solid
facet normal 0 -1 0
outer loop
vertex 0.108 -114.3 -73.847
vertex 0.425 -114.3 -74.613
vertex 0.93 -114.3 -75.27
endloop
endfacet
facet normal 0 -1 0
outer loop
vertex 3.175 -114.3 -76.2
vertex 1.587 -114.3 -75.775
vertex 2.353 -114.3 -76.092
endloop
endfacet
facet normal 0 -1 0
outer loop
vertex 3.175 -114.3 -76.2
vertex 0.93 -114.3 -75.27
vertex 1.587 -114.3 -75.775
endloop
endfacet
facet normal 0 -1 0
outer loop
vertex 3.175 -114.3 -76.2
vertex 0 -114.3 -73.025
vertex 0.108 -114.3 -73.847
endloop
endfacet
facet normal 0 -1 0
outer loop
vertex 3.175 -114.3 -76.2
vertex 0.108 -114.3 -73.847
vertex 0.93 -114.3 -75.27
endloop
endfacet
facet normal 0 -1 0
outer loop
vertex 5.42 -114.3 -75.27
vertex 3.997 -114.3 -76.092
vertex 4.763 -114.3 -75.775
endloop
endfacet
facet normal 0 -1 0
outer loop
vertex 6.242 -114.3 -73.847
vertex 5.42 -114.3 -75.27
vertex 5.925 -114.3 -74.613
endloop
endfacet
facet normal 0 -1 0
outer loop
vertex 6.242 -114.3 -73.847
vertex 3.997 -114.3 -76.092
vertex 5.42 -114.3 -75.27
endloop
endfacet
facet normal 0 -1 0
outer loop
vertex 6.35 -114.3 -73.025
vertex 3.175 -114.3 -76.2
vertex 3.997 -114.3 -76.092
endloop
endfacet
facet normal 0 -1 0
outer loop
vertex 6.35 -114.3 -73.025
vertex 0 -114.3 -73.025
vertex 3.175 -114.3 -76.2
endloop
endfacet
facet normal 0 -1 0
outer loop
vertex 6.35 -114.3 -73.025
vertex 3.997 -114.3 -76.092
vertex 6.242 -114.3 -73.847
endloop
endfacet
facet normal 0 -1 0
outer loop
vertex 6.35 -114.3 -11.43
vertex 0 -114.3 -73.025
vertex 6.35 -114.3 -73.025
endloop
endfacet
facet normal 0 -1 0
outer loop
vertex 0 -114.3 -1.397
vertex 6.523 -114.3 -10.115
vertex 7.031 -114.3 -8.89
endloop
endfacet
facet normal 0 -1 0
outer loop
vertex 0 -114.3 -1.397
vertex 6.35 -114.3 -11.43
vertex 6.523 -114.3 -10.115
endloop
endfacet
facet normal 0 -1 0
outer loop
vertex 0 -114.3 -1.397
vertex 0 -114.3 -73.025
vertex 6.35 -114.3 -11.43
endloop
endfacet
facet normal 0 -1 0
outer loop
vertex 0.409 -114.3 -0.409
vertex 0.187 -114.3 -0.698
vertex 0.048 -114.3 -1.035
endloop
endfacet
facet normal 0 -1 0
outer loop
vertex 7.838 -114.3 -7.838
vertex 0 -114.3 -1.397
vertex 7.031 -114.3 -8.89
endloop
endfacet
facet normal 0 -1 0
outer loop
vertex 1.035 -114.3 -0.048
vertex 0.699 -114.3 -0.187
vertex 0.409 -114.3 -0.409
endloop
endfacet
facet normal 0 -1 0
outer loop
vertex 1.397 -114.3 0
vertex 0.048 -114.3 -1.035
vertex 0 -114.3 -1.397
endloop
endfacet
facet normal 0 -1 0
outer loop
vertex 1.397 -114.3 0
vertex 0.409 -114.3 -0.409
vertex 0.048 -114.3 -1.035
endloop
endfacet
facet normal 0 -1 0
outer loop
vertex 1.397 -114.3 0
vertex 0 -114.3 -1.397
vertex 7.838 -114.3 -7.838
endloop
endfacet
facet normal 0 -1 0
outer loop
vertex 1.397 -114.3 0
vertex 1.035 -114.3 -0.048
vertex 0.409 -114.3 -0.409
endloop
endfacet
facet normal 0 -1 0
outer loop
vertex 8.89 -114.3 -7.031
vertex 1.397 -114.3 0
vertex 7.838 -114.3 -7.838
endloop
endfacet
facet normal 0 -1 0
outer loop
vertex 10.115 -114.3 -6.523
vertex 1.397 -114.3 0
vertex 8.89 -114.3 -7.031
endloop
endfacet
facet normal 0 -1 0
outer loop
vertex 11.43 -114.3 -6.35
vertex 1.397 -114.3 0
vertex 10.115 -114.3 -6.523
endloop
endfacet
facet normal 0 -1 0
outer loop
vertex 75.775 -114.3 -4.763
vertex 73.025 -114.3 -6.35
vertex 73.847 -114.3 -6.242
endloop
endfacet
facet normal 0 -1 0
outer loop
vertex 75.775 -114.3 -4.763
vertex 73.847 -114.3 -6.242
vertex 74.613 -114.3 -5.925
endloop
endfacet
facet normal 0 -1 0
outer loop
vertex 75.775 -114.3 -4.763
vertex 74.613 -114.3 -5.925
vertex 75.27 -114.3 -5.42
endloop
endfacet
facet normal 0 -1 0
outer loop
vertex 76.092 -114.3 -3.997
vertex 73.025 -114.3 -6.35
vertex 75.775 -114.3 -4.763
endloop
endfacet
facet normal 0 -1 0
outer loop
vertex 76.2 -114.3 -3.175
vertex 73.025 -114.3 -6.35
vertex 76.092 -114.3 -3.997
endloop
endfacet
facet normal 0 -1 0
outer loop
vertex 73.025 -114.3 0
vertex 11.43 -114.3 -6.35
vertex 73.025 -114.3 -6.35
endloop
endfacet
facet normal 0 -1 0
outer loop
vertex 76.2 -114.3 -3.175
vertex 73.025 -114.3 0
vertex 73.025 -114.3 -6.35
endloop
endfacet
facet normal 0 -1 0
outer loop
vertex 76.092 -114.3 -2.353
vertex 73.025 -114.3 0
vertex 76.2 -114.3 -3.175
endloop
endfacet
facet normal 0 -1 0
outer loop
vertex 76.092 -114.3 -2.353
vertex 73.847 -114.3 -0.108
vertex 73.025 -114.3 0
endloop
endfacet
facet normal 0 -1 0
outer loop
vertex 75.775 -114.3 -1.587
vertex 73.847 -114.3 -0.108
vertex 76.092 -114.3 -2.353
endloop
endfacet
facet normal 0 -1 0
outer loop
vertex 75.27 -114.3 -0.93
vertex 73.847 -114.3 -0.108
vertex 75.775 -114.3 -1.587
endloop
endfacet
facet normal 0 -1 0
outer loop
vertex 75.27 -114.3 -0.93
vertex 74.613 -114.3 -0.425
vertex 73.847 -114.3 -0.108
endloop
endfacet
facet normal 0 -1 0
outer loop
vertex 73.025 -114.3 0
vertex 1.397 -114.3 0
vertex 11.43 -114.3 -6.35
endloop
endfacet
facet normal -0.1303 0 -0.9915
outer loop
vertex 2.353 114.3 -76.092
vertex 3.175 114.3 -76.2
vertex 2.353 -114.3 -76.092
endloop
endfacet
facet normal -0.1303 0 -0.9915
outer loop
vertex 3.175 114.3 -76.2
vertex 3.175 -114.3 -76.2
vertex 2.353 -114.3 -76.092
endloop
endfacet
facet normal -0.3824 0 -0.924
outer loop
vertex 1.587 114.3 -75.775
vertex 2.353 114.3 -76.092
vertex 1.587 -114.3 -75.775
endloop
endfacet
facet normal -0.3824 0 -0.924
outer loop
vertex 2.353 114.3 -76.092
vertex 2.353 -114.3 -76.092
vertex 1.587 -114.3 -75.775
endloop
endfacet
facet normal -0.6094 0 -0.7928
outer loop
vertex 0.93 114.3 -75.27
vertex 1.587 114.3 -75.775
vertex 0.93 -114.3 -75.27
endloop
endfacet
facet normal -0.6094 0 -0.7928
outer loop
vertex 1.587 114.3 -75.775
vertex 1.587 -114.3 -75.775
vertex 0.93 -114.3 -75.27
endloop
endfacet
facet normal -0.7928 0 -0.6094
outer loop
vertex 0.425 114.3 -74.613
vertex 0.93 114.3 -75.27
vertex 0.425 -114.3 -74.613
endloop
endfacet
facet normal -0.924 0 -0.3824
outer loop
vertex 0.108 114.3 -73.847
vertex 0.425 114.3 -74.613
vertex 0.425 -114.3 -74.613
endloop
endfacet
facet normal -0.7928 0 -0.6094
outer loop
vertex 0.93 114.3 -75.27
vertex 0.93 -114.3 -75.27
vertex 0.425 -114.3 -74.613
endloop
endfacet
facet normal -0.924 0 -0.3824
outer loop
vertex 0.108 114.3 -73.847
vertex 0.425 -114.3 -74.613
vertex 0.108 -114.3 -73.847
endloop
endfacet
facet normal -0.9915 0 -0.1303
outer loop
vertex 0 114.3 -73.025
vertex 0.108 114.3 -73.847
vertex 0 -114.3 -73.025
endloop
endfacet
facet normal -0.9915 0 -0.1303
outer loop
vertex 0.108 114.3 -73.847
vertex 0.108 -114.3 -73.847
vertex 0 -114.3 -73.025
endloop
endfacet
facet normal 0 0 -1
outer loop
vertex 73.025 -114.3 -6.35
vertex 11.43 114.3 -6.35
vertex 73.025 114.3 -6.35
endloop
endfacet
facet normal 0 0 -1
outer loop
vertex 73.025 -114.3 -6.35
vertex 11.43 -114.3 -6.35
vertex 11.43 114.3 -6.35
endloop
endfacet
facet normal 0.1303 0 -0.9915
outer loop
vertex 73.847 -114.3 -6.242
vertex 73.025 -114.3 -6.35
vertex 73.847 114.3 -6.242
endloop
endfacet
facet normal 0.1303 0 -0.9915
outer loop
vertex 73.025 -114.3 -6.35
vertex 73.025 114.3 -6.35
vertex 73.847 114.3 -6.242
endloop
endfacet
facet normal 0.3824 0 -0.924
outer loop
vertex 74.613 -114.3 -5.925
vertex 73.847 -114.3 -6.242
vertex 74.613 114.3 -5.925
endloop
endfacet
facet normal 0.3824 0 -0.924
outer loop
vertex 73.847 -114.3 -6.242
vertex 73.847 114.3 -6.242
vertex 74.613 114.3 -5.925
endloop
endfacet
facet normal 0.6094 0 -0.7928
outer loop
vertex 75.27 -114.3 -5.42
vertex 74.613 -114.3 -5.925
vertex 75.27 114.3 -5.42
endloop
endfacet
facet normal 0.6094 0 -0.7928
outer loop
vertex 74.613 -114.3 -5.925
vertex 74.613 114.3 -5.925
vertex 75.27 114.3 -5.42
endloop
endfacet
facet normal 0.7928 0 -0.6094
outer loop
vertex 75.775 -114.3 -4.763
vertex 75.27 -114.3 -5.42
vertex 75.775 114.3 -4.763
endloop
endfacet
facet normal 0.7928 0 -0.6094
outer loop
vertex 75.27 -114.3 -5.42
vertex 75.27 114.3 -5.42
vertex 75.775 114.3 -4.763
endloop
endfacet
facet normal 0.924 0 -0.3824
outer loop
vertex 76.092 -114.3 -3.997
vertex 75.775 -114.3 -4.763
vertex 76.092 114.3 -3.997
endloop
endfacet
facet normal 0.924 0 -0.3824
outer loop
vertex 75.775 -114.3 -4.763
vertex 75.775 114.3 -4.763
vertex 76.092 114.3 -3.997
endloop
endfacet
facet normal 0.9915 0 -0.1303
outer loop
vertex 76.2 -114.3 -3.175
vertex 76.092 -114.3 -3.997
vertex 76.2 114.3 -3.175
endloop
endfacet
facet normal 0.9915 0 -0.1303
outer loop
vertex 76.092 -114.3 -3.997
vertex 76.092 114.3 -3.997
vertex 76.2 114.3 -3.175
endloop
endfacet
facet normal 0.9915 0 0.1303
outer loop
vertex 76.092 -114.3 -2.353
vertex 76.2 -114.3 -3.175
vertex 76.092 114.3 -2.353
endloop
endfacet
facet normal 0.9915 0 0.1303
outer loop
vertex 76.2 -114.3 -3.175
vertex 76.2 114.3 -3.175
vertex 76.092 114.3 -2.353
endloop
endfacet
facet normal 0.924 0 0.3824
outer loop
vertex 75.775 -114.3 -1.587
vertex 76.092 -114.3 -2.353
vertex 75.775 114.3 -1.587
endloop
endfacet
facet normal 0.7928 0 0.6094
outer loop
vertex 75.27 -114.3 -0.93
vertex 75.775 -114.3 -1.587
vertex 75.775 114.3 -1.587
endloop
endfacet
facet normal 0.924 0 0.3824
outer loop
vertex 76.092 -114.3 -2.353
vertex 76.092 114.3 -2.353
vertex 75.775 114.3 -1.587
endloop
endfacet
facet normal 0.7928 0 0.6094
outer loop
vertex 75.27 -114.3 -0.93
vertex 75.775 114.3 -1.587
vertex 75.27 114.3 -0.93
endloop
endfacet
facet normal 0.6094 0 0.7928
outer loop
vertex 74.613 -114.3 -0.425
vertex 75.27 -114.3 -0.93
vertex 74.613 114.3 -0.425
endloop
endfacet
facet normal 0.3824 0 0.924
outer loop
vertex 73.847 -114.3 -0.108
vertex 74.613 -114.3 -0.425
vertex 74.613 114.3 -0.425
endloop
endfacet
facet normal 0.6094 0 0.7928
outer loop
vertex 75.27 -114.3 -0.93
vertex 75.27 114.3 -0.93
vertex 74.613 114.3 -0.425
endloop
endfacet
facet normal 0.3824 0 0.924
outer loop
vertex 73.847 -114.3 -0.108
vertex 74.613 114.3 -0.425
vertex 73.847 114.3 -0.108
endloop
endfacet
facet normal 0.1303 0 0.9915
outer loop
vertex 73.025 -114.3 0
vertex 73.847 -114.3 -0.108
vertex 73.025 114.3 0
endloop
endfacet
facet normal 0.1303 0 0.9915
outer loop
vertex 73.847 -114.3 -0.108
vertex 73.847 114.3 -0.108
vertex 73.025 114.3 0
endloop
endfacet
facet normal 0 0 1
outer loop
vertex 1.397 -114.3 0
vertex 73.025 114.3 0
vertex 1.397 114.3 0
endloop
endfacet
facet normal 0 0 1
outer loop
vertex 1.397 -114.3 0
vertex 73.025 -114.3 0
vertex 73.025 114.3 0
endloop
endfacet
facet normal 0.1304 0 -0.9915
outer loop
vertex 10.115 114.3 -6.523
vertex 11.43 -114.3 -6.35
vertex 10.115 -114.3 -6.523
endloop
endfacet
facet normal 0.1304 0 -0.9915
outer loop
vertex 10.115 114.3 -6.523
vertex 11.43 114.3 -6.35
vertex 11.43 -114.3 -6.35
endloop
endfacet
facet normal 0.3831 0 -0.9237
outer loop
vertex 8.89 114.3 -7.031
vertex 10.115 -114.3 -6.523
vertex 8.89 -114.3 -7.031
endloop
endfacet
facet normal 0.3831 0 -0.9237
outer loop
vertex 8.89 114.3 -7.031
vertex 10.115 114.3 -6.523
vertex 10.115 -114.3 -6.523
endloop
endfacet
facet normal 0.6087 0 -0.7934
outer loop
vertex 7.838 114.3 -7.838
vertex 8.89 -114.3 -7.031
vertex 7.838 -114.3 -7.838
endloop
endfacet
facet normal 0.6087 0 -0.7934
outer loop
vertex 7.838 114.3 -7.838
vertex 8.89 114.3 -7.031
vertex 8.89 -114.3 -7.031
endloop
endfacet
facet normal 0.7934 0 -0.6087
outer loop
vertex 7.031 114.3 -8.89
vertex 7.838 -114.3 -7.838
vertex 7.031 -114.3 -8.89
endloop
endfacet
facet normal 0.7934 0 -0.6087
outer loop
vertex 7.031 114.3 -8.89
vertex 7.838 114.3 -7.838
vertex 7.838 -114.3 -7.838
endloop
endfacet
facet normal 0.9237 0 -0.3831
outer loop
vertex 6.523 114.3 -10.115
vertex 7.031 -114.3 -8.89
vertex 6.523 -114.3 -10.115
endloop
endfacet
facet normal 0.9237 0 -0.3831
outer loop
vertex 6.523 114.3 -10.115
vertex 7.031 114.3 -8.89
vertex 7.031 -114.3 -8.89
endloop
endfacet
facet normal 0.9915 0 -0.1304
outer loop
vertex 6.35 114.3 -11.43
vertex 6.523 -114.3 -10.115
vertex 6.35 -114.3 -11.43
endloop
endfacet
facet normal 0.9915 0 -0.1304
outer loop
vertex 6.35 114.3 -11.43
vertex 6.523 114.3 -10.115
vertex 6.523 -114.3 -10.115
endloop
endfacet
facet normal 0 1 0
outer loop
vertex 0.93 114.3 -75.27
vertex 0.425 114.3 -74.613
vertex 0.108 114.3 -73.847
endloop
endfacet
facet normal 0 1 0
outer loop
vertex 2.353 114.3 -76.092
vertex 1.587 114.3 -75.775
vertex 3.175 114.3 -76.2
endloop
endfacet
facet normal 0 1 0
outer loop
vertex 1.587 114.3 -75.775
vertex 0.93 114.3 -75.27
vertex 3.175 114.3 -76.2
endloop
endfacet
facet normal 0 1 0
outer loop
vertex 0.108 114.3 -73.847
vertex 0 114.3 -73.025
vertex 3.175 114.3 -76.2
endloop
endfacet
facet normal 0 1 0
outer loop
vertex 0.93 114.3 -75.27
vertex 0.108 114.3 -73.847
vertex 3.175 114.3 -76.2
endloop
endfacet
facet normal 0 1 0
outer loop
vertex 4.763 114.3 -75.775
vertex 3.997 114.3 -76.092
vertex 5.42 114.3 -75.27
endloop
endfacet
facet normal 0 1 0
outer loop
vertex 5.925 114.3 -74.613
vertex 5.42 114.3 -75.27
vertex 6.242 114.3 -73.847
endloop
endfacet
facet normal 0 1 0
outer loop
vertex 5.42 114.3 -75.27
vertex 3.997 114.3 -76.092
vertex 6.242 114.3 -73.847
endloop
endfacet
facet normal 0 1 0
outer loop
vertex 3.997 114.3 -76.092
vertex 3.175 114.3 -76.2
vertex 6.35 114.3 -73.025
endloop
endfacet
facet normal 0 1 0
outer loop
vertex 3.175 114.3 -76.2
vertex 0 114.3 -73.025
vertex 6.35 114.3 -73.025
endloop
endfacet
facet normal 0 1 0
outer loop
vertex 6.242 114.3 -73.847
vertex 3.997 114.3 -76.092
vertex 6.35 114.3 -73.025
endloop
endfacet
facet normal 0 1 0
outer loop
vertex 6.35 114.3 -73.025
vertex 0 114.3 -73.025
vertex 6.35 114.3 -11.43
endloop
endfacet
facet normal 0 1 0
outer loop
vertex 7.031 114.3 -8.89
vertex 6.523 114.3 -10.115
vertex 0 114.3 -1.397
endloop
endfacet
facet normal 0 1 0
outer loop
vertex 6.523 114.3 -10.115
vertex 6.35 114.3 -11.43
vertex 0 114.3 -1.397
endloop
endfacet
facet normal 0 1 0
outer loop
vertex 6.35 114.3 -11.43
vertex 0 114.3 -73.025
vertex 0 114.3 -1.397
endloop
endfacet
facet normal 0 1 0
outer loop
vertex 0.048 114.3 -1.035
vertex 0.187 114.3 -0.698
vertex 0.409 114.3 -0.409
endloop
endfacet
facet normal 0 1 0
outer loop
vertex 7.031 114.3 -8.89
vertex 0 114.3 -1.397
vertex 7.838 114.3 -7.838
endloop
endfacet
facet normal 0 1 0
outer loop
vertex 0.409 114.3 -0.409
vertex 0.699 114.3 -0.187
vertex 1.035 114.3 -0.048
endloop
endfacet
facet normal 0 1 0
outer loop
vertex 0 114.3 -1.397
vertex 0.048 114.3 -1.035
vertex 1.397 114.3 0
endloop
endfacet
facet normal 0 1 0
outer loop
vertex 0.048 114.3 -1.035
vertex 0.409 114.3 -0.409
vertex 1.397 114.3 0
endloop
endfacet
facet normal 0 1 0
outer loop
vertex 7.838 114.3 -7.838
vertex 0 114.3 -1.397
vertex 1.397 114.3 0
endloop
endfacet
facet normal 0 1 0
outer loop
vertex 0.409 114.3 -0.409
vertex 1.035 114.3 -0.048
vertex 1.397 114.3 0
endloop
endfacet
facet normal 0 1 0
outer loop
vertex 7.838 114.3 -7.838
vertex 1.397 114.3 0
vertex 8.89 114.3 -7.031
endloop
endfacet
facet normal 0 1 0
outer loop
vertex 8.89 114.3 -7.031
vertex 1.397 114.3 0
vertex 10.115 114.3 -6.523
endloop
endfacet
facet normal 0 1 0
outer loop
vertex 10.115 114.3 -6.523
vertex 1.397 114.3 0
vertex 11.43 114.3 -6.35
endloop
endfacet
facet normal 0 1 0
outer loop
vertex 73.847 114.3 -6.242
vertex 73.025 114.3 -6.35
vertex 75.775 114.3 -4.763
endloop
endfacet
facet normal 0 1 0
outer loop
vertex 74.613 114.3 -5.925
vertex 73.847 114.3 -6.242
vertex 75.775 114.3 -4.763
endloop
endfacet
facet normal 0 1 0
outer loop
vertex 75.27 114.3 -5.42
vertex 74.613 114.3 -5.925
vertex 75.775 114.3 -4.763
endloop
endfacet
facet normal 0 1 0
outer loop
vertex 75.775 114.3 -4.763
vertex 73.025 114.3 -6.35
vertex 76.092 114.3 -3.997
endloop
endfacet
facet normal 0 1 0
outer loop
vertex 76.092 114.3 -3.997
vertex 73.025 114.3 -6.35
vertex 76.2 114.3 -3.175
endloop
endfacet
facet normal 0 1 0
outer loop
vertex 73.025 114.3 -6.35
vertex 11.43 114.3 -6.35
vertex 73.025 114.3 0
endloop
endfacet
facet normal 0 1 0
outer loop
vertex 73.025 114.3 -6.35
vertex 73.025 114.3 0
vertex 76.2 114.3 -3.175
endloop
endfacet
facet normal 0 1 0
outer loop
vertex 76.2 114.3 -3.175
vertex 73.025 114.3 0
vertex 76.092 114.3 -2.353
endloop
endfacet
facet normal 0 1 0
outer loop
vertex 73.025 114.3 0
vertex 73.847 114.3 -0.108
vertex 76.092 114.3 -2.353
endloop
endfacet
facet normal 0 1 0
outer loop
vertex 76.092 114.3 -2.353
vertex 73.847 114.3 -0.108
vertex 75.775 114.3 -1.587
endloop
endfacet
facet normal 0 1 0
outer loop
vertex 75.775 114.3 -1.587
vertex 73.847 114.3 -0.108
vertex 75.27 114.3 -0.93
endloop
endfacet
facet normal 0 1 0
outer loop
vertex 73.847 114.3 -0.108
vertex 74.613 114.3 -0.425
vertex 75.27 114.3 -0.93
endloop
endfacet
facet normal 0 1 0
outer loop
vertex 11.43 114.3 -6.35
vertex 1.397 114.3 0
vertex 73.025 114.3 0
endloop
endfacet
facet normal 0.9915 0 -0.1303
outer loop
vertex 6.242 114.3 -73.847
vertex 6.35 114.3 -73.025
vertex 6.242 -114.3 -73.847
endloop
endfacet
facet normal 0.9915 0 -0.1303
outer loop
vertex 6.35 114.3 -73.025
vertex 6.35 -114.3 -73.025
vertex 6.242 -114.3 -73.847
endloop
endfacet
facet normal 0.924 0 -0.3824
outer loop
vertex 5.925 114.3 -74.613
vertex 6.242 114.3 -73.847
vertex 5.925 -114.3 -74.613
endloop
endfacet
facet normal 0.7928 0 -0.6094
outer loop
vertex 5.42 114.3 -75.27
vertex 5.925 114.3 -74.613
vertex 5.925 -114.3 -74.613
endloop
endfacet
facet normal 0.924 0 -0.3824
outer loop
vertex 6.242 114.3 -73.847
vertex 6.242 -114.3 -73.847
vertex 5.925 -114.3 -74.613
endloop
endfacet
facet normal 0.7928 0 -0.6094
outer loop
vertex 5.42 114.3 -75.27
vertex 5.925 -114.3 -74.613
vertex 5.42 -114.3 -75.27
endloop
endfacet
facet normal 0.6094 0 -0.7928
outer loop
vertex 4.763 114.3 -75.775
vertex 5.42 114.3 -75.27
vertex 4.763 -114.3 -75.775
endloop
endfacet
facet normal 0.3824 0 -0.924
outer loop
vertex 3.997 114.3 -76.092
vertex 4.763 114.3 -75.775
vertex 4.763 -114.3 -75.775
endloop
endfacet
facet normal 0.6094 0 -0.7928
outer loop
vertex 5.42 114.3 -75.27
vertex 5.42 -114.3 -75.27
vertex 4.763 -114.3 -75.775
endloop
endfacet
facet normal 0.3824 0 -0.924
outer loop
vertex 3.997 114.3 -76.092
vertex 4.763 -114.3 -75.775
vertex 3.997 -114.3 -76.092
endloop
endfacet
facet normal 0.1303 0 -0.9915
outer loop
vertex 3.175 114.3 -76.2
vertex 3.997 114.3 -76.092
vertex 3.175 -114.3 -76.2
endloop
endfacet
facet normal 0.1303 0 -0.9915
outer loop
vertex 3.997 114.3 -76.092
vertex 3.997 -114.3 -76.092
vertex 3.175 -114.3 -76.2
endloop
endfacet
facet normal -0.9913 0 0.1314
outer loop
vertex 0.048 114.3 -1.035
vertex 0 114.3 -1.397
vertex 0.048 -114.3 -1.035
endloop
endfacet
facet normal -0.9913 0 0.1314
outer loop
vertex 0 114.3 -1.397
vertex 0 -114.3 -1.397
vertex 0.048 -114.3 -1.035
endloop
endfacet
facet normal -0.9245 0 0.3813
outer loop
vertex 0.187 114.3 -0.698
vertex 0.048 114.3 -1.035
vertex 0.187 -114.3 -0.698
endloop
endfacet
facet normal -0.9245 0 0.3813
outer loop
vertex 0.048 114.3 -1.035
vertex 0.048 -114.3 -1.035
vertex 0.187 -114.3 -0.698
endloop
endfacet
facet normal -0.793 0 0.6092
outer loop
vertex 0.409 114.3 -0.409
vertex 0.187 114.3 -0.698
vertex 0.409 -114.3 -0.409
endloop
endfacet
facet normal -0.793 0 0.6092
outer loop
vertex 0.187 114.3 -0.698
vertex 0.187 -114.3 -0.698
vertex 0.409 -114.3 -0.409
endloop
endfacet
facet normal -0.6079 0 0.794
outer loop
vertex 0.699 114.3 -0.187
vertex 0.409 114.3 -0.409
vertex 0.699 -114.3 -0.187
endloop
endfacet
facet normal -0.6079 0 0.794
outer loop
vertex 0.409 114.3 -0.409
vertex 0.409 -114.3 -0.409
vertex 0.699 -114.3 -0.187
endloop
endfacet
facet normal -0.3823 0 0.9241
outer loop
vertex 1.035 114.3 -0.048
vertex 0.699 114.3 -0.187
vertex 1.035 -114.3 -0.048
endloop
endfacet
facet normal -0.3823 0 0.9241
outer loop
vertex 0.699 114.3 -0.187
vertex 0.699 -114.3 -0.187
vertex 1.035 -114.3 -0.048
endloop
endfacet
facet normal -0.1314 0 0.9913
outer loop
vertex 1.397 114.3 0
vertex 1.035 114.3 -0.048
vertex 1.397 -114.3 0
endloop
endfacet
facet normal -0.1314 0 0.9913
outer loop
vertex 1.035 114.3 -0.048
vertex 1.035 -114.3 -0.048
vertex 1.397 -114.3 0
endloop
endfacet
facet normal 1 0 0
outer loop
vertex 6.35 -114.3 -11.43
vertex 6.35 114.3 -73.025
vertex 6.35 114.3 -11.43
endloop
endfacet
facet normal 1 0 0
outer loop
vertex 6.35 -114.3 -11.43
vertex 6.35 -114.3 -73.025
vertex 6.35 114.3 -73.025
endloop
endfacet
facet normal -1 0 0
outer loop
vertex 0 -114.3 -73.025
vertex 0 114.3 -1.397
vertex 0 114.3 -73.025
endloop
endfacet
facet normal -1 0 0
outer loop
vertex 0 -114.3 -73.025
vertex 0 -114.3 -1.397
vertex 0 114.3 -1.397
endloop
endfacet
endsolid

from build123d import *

# Parameters (mm, degrees)
F1_DEPTH = 114.3
F2_R     = 5.08
F3_R     = 3.17499
F4_R     = 1.397


# Not quite as in the source:
# - a fillet or chamfer is up to 0.001 mm smaller than in the source, because OpenCascade refuses the exact size


with BuildPart() as f1:
    # F0 (on Front) → F1 (new body, symmetric)
    with BuildSketch(Plane.XZ):
        Polygon((76.2, 0), (0, 0), (0, -76.2), (6.35, -76.2), (6.35, -6.35), (76.2, -6.35), align=None)
    extrude(amount=F1_DEPTH, both=True)

    # F2
    f2_edges = [f1.edges().sort_by_distance(p)[0] for p in [
        (6.35, 0, -6.35),
    ]]
    fillet(f2_edges, radius=F2_R)

    # F3 (radius 3.175 in the source; OpenCascade refuses exactly that, so slightly less here)
    f3_edges = [f1.edges().sort_by_distance(p)[0] for p in [
        (76.2, 0, -6.35),
        (76.2, 0, 0),
        (0, 0, -76.2),
        (6.35, 0, -76.2),
    ]]
    fillet(f3_edges, radius=F3_R)

    # F4
    f4_edges = [f1.edges().sort_by_distance(p)[0] for p in [
        (0, 0, 0),
    ]]
    fillet(f4_edges, radius=F4_R)


solid = f1.part
